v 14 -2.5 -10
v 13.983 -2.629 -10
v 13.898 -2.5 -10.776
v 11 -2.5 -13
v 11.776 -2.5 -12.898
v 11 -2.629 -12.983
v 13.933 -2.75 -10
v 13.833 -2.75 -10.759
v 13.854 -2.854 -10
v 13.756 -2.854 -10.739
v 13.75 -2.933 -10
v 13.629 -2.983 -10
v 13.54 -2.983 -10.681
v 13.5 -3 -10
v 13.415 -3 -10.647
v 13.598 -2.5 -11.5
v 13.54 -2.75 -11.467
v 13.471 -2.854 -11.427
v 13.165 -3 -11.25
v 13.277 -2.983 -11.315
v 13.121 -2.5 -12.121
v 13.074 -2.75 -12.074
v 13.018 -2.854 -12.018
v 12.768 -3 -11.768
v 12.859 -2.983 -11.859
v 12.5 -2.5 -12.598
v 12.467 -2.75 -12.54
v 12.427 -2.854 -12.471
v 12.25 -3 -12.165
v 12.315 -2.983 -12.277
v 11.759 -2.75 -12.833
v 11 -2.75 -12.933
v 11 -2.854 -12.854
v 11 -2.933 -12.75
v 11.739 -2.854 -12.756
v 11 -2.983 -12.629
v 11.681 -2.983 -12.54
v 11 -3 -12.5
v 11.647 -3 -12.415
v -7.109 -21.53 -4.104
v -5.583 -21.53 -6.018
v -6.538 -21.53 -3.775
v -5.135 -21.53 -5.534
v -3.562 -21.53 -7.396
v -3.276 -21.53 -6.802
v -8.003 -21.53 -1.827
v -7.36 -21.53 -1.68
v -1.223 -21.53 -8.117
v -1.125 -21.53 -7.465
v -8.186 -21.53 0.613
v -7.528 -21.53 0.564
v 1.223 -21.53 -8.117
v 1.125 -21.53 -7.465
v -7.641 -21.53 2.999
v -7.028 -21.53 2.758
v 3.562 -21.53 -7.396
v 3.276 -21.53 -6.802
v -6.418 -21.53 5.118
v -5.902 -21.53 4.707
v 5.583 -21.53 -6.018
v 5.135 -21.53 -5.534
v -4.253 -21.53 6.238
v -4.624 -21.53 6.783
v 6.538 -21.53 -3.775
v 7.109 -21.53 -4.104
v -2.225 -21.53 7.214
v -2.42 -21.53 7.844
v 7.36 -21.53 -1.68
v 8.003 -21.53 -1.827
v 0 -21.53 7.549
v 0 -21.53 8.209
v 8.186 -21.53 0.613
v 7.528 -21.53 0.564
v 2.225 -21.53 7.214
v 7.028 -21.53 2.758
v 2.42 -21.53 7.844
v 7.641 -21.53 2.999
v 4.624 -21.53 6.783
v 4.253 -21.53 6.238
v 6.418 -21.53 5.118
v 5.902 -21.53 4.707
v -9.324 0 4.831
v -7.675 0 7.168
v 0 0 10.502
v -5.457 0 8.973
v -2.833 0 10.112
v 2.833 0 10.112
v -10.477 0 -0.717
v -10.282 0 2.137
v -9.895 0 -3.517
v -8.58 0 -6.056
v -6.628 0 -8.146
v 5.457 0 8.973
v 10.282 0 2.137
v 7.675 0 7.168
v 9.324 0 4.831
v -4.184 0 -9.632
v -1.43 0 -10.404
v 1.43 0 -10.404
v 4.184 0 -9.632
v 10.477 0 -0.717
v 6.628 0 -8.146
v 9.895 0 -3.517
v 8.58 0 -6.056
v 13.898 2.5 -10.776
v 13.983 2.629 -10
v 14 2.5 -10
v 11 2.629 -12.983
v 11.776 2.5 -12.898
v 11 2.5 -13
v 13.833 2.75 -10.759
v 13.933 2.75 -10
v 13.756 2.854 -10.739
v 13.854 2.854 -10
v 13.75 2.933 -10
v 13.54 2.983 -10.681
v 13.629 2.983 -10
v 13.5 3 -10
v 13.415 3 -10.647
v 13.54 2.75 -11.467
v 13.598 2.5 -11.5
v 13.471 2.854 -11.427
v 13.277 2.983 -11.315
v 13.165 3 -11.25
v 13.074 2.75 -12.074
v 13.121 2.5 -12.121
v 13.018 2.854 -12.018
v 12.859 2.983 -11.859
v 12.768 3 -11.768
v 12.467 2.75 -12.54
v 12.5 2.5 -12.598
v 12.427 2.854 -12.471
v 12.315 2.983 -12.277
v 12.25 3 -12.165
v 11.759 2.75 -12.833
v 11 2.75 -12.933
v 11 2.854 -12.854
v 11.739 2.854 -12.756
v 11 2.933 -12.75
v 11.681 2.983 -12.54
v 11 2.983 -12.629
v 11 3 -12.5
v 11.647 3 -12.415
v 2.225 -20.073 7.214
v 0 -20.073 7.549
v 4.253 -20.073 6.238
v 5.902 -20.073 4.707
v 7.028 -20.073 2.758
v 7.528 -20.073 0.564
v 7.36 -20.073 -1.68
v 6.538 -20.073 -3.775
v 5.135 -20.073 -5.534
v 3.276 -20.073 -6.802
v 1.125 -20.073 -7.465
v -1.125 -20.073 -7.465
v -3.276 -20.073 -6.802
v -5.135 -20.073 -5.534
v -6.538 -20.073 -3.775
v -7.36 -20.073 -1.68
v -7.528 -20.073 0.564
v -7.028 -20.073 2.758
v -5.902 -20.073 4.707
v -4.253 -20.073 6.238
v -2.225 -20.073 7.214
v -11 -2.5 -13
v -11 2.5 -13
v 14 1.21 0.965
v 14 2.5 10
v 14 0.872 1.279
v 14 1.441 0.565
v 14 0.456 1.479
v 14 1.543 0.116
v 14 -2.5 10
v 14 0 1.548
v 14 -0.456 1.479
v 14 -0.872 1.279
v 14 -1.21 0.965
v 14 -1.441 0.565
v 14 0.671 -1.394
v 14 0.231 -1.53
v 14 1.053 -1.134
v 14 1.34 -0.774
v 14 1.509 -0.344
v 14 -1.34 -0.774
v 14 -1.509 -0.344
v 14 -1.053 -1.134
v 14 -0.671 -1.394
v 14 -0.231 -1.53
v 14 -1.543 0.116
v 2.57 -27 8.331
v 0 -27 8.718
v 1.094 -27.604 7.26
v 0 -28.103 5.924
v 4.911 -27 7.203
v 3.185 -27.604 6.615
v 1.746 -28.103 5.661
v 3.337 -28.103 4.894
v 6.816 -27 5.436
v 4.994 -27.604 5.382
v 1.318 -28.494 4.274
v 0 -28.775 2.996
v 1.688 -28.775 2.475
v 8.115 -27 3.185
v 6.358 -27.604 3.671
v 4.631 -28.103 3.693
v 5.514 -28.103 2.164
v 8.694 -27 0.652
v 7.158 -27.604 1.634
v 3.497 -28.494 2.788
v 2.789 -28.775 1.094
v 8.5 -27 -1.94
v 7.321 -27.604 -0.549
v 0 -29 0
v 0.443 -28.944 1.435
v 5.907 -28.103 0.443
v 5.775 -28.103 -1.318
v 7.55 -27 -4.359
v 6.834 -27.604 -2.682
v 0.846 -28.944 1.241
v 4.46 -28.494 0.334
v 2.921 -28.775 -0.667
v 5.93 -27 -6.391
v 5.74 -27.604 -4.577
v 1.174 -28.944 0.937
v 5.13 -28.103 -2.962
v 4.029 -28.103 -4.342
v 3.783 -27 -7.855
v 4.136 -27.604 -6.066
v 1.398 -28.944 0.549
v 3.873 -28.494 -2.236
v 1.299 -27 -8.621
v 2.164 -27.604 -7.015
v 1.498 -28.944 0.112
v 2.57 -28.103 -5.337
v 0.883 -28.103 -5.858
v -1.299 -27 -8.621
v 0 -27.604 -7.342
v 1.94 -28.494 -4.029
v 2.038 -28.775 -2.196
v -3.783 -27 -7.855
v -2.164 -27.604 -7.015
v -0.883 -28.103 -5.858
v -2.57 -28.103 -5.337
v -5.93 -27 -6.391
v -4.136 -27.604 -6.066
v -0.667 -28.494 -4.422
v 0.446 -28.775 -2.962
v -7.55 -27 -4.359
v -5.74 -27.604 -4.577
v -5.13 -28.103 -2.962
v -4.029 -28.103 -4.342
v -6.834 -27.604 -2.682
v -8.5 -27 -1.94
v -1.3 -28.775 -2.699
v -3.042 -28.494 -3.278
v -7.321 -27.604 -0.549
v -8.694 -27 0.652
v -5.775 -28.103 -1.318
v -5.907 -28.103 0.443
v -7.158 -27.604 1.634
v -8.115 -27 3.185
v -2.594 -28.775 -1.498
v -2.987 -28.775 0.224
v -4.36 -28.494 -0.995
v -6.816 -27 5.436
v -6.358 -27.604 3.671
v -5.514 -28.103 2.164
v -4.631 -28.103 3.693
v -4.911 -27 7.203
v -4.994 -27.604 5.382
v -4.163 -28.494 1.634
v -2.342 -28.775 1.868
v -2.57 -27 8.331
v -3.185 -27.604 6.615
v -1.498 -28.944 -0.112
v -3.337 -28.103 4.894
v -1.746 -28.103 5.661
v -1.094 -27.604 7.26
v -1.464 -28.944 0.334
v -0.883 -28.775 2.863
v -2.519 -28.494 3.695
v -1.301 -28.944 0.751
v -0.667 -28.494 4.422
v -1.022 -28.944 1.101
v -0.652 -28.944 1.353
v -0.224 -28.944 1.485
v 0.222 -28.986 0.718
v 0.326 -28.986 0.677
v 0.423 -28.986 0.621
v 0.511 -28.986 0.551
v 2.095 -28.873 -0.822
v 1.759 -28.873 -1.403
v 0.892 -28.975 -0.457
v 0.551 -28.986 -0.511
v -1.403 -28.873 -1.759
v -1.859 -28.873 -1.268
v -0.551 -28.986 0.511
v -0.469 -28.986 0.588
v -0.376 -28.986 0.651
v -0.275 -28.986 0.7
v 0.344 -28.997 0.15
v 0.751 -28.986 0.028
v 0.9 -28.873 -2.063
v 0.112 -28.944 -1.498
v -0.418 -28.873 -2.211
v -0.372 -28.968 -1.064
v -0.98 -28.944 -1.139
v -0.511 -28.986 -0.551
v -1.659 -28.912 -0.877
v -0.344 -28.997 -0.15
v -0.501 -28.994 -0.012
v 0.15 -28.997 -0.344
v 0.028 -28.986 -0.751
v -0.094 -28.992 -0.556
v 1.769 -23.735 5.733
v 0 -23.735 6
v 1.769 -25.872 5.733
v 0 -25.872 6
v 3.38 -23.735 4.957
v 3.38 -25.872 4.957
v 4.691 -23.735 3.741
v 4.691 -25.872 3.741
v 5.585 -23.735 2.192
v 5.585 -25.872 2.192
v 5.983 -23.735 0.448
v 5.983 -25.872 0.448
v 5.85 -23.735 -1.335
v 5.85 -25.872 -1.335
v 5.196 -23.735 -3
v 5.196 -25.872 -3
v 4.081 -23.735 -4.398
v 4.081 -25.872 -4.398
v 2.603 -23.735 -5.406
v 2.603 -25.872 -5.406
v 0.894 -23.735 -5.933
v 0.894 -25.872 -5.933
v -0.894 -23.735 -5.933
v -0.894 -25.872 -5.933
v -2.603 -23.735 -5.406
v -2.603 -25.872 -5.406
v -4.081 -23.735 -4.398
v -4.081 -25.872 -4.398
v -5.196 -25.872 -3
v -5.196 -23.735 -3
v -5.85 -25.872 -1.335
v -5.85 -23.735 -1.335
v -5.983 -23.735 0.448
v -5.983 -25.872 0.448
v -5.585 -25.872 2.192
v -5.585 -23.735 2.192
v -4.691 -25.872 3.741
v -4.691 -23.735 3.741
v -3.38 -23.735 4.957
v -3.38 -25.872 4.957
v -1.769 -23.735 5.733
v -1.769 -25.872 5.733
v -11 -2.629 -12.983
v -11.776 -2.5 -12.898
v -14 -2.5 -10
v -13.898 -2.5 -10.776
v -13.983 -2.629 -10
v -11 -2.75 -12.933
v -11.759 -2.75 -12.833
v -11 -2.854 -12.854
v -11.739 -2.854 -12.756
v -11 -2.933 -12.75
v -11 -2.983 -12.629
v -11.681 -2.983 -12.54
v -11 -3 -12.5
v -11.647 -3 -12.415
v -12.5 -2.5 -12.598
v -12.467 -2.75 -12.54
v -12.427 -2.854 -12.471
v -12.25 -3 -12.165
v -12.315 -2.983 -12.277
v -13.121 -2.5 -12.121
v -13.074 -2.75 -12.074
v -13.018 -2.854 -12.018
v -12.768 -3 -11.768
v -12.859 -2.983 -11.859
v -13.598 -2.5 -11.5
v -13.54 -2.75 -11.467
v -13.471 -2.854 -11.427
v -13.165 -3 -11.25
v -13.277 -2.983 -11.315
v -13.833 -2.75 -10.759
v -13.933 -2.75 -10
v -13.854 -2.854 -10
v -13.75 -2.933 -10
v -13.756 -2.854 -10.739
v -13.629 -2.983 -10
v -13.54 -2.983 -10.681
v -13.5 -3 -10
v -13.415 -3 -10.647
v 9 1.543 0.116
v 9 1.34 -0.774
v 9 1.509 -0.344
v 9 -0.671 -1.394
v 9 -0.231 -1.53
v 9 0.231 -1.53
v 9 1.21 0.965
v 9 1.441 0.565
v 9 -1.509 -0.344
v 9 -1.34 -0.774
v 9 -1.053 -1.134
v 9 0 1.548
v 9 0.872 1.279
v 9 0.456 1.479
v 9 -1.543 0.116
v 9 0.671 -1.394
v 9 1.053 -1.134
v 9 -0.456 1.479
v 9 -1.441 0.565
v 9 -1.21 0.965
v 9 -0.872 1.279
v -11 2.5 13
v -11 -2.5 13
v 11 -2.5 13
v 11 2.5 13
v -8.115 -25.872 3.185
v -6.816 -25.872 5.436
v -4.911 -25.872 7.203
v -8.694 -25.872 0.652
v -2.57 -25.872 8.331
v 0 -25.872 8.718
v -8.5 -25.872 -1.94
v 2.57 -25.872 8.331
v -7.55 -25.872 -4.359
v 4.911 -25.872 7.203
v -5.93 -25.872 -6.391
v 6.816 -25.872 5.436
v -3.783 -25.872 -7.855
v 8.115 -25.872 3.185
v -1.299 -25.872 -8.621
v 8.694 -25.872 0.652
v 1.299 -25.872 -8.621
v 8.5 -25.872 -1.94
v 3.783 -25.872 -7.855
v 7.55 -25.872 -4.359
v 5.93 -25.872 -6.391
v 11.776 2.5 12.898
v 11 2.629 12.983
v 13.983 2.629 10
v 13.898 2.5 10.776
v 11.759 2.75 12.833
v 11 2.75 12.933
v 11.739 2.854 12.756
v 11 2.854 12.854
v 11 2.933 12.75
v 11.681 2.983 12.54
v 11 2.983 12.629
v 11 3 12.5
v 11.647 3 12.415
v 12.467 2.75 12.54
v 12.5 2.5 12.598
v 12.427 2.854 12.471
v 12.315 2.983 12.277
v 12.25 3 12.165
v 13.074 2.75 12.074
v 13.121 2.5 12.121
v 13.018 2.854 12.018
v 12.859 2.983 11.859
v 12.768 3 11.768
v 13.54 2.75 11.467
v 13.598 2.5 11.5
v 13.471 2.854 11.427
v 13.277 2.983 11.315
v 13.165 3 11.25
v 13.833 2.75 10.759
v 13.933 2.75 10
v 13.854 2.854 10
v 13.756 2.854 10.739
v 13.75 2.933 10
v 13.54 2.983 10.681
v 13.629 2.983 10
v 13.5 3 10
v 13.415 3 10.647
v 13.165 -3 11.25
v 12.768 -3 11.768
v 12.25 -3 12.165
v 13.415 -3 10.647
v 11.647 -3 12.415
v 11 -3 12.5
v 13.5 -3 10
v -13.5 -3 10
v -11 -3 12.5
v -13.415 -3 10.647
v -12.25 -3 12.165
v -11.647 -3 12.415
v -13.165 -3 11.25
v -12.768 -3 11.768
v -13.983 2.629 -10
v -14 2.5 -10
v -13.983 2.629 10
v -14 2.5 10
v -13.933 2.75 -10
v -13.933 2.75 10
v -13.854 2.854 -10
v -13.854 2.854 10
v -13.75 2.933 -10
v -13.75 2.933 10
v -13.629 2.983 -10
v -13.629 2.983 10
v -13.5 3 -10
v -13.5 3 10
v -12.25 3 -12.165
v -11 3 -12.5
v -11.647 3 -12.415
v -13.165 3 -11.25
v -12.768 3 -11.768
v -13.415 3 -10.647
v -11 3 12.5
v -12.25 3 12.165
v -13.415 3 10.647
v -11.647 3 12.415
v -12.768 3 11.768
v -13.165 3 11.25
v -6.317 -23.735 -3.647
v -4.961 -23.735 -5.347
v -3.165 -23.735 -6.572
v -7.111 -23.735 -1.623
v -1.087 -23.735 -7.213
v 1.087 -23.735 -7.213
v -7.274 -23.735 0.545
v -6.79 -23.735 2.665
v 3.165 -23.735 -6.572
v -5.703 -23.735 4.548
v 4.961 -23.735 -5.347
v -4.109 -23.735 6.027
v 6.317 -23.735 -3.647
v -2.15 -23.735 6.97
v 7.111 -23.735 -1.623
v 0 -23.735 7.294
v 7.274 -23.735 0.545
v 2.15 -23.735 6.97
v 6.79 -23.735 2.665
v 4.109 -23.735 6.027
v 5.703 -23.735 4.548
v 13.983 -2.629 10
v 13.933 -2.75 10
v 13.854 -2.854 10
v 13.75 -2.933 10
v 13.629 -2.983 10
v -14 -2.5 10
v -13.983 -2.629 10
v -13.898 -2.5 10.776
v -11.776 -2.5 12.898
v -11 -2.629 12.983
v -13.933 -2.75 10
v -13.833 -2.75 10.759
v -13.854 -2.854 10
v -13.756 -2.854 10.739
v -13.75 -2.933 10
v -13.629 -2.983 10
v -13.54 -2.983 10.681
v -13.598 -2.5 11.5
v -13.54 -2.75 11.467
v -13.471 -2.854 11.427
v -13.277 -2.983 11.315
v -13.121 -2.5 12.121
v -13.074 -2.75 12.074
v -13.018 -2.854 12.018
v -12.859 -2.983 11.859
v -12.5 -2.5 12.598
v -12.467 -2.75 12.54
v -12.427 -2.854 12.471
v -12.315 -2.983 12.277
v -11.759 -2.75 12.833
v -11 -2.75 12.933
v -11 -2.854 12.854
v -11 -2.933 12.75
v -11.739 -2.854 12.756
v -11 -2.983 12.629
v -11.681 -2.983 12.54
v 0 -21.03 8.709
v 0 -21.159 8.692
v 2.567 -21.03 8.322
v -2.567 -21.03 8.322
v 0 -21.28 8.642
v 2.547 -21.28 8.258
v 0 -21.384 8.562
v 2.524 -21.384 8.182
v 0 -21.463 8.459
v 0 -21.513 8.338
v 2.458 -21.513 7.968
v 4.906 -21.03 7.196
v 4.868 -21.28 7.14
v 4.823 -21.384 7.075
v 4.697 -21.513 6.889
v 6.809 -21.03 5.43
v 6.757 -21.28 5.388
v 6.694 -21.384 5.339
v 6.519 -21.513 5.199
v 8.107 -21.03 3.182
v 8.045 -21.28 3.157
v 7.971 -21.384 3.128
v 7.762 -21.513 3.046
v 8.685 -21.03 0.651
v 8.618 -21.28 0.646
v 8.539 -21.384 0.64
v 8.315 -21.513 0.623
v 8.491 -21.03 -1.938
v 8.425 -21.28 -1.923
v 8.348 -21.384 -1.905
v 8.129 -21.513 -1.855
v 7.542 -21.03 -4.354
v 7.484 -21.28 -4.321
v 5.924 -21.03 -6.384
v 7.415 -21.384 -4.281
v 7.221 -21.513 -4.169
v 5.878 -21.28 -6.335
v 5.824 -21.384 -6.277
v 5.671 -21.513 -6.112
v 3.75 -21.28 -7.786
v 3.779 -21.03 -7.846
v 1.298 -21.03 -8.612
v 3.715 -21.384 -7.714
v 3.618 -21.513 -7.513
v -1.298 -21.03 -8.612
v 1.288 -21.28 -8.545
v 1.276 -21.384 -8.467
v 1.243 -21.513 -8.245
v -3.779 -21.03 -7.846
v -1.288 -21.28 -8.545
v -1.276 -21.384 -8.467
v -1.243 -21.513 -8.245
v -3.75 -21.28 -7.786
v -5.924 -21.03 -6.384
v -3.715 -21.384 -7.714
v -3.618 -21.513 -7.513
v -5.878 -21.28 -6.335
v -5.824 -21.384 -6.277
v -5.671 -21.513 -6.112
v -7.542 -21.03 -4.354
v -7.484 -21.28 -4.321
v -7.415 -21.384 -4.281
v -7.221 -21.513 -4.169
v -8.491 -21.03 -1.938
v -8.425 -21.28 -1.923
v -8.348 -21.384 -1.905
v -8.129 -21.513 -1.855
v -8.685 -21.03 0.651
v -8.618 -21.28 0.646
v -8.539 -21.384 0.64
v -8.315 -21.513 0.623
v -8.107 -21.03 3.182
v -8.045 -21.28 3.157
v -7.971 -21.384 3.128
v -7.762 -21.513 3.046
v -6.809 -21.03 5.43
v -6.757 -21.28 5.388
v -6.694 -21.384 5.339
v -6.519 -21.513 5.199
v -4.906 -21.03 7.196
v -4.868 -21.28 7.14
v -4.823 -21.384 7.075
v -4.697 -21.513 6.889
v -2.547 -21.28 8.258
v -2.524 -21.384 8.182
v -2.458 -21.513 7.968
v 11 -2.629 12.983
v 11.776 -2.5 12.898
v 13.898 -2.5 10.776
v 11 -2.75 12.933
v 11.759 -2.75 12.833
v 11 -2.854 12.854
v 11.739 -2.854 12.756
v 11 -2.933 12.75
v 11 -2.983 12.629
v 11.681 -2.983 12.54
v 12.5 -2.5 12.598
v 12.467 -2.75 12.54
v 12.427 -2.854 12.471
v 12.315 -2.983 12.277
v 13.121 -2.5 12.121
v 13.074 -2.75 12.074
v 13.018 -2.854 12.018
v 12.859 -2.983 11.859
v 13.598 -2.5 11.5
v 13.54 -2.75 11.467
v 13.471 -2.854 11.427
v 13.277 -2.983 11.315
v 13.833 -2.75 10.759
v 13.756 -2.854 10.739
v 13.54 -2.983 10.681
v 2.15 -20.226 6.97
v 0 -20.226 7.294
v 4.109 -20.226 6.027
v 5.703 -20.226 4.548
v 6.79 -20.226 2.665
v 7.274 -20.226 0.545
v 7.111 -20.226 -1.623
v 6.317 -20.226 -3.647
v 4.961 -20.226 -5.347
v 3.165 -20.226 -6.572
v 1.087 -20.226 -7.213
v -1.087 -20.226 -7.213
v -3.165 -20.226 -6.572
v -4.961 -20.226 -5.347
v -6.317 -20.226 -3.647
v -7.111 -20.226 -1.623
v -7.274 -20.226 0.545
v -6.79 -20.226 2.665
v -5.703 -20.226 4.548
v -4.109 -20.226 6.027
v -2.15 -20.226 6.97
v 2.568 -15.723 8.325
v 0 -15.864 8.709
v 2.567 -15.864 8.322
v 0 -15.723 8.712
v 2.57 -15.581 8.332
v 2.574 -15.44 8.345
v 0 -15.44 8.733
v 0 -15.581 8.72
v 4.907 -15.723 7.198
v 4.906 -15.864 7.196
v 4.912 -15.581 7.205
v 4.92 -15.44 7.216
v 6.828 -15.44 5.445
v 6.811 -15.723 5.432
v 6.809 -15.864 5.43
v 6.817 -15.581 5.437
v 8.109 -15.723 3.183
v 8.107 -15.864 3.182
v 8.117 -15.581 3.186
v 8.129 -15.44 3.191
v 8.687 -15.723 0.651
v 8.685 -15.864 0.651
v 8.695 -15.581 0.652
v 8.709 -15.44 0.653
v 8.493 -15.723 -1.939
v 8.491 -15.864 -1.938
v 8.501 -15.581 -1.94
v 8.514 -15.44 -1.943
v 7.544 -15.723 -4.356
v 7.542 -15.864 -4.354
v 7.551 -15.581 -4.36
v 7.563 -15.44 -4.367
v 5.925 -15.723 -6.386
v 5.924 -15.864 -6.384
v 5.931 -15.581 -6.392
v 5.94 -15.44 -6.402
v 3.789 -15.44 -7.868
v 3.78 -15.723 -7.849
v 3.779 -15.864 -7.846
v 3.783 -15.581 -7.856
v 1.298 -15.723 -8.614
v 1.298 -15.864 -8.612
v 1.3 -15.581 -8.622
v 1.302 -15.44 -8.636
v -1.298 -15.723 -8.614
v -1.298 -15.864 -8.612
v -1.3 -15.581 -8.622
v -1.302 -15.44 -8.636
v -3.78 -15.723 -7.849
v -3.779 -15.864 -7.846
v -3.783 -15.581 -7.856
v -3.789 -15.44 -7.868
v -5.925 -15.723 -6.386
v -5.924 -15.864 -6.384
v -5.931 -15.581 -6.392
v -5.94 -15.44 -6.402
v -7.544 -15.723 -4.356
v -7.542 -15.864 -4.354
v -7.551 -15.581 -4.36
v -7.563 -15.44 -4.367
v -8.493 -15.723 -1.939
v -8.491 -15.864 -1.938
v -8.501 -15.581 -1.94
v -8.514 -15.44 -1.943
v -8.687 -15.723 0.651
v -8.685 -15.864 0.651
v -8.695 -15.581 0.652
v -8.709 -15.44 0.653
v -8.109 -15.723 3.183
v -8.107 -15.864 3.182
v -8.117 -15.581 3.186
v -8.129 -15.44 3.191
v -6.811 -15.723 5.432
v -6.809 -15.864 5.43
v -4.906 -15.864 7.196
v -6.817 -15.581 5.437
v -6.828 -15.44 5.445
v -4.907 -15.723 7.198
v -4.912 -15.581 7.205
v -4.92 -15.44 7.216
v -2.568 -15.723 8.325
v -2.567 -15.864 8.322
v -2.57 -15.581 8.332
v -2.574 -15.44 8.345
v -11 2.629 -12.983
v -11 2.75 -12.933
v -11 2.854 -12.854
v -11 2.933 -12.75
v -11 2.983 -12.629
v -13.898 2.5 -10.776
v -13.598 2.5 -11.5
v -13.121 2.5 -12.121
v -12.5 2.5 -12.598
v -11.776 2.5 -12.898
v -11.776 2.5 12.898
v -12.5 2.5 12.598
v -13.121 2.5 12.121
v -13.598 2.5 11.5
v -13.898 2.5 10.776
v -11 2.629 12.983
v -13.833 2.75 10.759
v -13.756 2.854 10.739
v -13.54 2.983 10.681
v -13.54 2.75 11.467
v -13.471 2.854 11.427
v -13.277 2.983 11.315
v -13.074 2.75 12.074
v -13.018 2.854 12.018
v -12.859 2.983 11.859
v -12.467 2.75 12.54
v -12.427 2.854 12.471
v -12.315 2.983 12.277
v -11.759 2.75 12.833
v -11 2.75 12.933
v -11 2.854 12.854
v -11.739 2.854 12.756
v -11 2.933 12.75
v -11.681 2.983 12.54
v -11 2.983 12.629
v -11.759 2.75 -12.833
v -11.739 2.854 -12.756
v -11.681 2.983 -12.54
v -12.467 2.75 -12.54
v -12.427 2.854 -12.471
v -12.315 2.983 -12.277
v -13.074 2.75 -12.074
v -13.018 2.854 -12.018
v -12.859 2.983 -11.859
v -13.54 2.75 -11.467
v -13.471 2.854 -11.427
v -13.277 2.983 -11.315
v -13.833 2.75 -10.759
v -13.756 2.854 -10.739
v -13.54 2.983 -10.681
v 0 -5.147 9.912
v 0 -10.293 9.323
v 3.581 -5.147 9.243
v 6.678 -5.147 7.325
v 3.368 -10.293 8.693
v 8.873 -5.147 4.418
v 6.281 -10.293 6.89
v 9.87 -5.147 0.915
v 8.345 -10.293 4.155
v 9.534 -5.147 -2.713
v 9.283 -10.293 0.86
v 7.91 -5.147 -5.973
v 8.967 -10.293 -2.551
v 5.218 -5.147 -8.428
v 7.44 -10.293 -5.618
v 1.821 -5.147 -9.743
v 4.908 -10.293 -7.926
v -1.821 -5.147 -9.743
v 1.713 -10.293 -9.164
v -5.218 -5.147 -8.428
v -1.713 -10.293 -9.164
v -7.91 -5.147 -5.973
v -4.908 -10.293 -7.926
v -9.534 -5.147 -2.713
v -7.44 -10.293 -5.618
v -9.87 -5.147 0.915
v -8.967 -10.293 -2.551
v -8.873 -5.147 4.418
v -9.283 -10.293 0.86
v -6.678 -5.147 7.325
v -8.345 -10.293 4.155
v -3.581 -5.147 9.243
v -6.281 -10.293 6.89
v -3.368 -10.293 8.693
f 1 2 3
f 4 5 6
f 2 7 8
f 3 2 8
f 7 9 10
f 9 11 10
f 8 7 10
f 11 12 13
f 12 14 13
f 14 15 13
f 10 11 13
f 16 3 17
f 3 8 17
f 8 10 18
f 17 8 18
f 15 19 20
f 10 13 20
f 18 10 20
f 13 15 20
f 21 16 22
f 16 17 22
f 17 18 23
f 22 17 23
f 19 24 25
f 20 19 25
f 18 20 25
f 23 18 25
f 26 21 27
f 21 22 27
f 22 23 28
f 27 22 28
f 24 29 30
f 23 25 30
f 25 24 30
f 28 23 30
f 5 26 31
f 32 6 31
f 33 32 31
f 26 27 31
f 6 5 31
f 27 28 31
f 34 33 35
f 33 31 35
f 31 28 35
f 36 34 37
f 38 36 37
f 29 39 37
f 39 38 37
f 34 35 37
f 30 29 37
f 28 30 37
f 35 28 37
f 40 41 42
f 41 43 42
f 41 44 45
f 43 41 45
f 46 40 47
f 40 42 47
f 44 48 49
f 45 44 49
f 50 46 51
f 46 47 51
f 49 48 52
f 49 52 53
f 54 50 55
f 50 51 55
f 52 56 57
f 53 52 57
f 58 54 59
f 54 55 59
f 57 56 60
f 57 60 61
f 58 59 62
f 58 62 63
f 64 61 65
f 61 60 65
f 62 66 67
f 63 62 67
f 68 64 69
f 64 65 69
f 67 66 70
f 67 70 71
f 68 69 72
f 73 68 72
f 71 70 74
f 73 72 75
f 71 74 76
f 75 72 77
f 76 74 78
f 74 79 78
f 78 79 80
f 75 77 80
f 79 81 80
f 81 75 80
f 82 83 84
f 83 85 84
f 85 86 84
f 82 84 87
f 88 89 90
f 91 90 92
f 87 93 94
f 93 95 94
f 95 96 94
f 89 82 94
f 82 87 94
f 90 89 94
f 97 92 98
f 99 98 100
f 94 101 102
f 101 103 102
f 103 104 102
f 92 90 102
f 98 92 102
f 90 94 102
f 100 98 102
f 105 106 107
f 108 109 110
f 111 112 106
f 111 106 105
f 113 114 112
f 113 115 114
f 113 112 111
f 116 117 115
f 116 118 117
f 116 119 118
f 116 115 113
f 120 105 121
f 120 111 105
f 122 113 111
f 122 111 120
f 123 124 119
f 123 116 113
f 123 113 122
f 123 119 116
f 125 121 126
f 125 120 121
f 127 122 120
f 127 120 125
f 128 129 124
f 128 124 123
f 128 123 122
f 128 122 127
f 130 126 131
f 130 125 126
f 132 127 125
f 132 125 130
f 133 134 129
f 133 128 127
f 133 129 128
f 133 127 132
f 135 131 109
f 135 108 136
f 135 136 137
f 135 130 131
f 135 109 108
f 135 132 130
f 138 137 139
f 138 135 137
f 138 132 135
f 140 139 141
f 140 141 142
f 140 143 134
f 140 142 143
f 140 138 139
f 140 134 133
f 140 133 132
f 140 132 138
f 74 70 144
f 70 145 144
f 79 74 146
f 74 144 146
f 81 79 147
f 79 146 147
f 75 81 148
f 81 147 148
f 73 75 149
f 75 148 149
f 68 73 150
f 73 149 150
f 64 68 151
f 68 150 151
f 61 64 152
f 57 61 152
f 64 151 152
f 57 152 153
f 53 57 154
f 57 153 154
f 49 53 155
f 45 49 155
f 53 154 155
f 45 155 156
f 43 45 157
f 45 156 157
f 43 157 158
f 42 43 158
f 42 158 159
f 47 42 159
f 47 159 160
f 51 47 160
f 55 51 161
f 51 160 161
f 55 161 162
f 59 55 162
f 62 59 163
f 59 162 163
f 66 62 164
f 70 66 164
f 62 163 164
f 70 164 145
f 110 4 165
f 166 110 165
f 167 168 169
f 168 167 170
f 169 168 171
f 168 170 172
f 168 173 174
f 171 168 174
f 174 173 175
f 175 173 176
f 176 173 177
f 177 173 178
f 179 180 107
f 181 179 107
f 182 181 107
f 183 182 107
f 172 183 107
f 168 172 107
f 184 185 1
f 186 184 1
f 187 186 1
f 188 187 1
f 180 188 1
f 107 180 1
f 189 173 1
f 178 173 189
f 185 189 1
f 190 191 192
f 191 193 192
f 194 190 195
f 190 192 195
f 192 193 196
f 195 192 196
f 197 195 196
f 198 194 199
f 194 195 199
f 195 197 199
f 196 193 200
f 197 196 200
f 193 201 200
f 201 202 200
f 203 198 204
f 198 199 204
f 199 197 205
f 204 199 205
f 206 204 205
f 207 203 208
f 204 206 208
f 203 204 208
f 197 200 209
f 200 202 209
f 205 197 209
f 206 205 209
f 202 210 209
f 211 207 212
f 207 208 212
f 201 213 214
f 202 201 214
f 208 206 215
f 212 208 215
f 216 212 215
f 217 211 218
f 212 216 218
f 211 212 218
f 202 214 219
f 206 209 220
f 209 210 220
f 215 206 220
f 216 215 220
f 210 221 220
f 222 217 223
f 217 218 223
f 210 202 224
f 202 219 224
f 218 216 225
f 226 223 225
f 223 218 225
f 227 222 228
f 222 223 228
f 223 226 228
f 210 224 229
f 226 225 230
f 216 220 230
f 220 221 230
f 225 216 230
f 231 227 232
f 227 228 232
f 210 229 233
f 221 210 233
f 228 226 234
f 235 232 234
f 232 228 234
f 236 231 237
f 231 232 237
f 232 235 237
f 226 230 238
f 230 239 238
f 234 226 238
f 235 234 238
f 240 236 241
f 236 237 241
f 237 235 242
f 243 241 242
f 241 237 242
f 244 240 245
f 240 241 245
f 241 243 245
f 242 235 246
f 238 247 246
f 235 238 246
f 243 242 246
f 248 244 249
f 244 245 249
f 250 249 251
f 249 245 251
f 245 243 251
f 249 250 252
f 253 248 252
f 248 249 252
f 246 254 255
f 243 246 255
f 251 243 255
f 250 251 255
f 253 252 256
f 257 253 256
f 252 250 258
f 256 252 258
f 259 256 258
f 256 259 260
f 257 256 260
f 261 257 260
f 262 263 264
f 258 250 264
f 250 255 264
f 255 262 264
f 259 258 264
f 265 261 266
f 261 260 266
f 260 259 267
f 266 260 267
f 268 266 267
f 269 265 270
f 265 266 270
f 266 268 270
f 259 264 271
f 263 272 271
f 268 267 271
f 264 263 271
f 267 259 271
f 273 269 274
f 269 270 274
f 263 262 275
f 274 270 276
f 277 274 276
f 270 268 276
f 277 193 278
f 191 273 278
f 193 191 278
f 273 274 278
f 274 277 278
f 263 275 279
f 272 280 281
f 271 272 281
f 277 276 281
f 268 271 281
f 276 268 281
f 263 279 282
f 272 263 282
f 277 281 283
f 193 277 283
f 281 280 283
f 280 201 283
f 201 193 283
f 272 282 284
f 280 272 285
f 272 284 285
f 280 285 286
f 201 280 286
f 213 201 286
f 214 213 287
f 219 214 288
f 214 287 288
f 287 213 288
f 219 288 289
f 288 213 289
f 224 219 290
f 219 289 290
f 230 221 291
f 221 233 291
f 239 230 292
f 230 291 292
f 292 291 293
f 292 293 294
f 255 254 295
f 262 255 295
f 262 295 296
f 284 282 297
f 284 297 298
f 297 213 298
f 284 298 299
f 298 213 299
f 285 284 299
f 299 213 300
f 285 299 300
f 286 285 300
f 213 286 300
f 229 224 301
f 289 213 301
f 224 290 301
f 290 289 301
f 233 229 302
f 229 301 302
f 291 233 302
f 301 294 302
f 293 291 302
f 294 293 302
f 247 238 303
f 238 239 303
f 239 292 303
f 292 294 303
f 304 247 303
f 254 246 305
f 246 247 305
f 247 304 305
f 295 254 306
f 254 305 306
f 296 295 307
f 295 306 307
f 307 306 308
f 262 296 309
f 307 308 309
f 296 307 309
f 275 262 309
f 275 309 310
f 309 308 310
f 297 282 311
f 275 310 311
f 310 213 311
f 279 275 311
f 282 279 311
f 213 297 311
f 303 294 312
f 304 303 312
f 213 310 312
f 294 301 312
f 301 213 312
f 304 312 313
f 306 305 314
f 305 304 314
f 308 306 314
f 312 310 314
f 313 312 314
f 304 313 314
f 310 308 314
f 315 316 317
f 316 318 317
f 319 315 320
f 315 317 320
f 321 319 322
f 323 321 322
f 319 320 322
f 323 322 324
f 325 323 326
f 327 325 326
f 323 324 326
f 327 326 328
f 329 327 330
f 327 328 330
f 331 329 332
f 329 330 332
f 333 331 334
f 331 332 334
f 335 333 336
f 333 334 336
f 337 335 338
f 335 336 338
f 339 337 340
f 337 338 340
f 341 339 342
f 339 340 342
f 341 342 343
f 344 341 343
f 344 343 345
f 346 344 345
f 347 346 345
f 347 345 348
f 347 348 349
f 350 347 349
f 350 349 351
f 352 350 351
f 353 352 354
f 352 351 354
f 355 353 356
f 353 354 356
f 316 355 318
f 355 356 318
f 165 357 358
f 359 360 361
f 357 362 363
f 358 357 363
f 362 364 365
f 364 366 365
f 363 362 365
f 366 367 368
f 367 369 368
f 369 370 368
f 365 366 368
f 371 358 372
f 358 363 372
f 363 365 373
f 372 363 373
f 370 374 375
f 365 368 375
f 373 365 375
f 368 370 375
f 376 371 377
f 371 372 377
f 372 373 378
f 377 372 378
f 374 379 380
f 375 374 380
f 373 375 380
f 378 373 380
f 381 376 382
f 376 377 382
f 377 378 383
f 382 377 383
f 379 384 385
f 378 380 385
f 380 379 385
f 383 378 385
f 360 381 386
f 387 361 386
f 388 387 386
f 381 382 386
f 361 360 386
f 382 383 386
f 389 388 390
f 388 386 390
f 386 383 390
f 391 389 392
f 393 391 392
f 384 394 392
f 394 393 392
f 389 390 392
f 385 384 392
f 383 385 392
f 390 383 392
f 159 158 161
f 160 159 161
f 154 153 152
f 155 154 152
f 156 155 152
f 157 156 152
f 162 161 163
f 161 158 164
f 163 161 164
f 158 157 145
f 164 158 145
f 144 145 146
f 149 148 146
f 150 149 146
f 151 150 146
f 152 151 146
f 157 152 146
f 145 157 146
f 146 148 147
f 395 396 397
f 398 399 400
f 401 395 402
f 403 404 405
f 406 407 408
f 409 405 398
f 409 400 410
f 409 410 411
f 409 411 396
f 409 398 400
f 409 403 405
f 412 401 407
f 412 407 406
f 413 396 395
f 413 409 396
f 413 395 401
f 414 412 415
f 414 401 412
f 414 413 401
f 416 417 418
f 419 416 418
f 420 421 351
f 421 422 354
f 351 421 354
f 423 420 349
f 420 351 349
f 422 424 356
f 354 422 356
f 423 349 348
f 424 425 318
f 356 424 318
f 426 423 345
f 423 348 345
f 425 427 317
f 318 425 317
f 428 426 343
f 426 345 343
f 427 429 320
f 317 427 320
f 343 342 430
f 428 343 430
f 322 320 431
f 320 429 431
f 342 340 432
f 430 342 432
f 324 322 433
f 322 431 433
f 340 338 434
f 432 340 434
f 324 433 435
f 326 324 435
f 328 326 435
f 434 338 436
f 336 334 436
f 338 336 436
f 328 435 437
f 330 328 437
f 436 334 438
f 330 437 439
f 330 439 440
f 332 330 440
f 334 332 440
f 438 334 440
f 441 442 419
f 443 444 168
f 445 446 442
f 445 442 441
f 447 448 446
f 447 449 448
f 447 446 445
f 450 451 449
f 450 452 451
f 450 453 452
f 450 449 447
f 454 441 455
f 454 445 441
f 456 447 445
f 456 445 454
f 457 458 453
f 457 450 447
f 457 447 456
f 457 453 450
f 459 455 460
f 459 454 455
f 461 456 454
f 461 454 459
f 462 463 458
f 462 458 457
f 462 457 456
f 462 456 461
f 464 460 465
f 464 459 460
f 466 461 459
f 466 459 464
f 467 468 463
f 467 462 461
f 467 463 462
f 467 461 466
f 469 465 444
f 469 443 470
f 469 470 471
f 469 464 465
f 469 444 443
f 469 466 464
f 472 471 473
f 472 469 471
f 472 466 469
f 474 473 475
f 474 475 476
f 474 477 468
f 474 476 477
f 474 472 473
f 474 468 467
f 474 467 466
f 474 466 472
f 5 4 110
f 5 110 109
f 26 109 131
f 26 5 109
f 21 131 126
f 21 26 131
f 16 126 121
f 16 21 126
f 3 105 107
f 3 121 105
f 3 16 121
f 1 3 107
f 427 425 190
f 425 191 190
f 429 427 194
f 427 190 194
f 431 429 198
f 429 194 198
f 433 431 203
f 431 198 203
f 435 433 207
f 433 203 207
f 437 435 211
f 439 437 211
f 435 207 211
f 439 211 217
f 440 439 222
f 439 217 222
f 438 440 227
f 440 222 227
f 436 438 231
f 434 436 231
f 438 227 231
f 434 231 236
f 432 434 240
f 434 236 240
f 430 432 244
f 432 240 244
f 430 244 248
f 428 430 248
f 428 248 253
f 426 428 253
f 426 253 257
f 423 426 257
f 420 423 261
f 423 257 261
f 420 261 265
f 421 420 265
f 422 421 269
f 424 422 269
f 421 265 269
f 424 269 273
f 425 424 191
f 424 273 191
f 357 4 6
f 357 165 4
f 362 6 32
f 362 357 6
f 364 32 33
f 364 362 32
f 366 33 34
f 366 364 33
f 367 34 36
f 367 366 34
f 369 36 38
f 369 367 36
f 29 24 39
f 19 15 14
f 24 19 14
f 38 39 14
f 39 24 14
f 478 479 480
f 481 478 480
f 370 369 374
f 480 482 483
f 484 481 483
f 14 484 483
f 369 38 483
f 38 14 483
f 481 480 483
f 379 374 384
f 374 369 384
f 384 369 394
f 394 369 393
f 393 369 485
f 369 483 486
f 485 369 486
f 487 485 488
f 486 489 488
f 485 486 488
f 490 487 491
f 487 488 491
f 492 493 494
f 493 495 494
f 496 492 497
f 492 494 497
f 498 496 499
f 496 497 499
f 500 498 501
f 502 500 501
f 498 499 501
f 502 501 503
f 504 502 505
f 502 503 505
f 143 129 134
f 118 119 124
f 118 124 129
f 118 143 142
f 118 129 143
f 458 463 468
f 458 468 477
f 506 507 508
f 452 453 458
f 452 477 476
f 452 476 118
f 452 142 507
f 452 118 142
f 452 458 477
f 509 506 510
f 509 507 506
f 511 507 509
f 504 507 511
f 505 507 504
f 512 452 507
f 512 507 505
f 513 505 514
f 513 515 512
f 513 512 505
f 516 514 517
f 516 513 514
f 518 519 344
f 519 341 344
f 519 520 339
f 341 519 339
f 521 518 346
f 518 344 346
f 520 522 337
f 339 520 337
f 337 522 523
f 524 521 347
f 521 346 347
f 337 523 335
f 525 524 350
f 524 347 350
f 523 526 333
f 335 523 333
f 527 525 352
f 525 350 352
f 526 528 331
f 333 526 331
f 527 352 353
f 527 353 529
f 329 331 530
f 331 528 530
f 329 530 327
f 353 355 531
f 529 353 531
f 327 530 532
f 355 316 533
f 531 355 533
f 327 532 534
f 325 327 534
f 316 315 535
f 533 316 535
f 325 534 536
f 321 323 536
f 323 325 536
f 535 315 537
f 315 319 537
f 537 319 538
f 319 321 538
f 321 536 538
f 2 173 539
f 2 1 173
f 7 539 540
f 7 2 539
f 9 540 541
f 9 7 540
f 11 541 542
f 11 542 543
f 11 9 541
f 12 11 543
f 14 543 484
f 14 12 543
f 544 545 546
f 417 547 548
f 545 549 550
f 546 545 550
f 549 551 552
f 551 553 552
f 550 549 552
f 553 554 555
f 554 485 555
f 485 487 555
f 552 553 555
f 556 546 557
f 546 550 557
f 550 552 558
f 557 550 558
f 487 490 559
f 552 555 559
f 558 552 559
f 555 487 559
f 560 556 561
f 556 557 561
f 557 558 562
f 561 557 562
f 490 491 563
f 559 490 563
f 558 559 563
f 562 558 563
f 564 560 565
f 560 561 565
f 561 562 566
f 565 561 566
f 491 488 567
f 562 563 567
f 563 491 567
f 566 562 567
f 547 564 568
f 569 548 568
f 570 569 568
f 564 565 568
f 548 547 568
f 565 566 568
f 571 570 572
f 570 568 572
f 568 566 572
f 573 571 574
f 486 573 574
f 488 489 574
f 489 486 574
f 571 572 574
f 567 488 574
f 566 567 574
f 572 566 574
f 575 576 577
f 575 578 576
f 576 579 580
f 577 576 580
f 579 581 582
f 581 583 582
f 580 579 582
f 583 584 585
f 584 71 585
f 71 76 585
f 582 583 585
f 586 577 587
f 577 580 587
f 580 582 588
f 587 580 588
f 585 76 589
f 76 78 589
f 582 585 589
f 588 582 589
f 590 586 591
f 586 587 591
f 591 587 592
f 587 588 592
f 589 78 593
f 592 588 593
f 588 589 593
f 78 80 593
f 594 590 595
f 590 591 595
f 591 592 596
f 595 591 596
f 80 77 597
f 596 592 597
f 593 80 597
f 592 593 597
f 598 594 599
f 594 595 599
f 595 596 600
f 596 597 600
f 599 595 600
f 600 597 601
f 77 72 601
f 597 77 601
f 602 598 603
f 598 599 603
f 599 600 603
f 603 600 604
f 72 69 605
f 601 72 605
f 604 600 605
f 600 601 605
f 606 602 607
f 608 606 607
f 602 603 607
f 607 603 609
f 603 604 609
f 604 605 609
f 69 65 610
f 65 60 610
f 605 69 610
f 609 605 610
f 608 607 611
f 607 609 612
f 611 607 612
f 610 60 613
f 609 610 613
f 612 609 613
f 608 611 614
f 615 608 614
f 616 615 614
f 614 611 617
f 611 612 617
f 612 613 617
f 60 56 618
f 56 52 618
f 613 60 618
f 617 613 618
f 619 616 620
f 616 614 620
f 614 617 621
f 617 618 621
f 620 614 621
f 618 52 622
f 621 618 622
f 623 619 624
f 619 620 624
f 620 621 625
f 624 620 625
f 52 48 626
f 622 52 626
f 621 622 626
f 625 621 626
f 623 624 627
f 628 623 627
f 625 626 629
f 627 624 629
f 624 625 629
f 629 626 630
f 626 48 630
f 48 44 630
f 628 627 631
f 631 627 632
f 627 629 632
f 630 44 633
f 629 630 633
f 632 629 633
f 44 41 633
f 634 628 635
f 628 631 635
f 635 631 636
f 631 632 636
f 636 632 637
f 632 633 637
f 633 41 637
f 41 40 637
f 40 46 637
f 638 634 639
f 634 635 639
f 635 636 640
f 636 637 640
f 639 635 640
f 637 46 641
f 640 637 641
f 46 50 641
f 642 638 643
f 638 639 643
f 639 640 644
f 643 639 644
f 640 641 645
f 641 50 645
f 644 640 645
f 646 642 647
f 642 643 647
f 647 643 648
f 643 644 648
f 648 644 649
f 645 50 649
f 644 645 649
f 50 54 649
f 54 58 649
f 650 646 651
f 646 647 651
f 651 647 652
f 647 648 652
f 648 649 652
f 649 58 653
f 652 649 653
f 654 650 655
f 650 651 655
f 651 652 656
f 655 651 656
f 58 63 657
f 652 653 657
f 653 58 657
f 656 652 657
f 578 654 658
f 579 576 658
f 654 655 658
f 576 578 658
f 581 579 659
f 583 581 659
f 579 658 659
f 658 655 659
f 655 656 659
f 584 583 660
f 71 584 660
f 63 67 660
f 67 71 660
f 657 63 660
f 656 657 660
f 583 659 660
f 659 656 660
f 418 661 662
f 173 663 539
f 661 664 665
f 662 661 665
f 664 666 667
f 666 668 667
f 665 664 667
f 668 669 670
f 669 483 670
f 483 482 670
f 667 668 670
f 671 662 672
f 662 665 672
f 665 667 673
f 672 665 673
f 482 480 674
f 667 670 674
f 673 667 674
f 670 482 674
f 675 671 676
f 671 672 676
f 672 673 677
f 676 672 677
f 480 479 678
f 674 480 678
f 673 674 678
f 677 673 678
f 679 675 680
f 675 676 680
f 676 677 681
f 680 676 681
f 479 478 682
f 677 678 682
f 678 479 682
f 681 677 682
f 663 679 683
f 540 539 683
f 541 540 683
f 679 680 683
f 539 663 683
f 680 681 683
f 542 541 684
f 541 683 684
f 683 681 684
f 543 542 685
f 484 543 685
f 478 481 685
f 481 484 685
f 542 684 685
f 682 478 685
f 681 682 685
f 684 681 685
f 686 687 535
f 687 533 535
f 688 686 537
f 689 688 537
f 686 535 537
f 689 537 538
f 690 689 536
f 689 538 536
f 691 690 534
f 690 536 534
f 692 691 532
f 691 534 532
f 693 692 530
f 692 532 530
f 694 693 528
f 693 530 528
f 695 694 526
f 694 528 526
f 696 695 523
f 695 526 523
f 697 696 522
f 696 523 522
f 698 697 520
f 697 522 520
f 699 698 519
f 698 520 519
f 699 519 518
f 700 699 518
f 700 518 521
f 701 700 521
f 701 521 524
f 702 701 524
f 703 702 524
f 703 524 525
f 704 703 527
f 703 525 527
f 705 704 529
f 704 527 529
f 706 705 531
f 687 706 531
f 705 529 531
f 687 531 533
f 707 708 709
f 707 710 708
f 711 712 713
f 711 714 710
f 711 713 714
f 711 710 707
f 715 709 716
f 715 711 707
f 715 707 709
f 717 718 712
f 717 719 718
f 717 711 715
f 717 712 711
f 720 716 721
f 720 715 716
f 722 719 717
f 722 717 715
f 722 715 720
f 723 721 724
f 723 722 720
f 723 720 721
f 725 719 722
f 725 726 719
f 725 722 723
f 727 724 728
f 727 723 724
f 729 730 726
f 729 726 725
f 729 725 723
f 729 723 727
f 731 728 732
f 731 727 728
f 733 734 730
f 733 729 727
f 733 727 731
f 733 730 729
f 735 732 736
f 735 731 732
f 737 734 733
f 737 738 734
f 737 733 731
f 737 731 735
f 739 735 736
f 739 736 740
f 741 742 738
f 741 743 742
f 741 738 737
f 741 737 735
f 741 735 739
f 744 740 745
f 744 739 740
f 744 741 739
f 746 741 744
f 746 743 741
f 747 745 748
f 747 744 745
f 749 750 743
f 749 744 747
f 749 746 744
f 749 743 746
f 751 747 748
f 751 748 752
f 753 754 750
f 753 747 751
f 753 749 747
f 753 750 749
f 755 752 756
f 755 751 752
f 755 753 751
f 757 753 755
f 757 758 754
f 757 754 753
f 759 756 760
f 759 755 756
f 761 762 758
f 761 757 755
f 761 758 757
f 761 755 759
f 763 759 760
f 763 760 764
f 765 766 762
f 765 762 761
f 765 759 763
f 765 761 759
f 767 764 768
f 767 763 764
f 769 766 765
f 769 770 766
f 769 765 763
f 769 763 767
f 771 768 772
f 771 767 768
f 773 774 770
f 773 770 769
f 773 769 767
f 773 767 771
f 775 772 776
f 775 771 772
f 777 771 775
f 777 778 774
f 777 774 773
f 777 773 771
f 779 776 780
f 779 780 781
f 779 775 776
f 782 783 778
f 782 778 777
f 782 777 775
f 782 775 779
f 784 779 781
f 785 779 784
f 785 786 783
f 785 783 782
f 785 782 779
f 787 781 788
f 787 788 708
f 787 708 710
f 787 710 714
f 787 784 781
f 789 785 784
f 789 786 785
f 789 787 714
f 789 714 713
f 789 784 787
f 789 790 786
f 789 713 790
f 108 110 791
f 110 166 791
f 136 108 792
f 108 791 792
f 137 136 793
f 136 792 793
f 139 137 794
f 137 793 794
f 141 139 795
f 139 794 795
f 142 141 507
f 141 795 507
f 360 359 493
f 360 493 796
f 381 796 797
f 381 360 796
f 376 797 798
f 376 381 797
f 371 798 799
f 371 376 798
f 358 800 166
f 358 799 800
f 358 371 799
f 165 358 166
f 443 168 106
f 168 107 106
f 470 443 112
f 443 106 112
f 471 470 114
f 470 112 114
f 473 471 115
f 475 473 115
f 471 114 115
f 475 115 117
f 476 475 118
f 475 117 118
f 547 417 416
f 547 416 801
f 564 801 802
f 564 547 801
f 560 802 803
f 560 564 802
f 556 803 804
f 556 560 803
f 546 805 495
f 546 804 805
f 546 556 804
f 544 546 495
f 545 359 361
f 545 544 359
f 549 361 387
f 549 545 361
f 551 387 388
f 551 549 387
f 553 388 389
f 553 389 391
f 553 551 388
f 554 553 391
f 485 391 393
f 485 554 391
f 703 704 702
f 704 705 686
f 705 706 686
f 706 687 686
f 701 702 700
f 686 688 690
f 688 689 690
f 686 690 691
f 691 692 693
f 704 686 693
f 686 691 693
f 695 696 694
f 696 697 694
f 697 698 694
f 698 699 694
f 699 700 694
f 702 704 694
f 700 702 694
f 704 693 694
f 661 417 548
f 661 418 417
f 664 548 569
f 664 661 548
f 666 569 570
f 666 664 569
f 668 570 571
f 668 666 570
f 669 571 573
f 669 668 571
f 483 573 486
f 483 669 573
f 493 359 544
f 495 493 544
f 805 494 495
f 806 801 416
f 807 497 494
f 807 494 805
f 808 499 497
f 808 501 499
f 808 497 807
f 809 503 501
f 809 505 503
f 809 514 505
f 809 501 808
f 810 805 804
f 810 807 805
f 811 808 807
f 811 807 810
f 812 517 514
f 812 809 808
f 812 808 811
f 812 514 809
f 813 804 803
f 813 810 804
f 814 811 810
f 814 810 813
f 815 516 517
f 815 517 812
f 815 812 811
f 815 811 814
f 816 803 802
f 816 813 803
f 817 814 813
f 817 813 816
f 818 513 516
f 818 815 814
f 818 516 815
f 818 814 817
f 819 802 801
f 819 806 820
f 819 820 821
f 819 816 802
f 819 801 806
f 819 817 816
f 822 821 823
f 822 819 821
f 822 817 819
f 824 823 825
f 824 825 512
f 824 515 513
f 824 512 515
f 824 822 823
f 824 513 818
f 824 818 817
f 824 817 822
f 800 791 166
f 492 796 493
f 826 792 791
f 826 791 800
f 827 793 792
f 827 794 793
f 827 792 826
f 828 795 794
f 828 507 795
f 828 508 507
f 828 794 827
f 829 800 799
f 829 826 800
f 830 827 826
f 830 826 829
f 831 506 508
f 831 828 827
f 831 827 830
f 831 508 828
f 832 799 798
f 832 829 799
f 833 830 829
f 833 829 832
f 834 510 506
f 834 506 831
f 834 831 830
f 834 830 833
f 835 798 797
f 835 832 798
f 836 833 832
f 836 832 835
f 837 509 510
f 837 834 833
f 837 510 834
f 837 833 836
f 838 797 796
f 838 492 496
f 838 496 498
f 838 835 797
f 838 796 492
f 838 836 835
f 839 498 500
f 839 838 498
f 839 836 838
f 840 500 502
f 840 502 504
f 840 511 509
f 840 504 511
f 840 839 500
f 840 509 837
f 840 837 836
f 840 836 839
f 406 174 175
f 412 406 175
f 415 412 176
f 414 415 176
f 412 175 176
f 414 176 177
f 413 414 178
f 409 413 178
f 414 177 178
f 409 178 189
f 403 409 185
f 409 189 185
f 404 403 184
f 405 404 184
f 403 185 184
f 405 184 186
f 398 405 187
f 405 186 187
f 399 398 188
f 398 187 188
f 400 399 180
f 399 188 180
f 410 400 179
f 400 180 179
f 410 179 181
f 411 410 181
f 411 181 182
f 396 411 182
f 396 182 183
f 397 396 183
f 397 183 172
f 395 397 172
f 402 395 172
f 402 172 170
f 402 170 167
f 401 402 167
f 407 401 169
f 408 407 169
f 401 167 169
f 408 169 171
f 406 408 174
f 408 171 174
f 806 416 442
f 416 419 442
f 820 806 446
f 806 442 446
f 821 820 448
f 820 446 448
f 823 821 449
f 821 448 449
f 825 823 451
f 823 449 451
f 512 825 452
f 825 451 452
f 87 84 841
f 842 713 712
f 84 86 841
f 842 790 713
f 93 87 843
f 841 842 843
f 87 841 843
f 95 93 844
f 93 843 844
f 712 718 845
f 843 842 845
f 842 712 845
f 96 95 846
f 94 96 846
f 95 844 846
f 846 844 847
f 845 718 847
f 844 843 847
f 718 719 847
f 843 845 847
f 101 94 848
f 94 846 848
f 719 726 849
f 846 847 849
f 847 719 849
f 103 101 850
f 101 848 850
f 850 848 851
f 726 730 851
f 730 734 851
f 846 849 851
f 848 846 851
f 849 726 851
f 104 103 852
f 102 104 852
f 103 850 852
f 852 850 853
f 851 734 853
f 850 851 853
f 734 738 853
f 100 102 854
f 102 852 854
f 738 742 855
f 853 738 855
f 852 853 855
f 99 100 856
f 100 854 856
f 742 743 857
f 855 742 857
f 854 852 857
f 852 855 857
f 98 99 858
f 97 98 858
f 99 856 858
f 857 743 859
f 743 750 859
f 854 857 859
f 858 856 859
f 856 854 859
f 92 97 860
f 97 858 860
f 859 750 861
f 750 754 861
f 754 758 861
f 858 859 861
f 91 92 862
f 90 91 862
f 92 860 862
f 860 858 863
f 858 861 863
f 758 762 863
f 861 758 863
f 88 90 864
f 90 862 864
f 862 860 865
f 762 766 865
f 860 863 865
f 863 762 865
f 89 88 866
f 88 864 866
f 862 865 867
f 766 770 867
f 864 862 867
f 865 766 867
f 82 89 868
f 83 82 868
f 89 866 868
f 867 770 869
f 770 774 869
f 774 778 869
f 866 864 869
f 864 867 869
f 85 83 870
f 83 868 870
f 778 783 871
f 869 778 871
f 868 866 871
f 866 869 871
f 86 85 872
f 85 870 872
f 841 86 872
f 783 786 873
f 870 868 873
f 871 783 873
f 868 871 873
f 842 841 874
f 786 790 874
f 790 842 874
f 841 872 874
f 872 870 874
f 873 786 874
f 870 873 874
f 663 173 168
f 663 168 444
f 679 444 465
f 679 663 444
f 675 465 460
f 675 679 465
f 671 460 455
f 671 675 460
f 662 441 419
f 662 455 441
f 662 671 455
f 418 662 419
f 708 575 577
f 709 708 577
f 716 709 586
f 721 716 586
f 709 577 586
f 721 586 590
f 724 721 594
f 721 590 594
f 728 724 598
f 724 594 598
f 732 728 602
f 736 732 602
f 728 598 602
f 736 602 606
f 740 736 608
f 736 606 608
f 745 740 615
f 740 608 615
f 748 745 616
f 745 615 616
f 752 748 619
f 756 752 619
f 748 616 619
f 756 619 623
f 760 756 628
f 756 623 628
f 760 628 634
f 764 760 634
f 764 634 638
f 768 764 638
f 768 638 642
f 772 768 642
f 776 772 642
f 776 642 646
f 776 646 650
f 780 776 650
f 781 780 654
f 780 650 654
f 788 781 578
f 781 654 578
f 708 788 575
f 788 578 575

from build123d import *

# Parameters (mm, degrees)
PAD_DEPTH    = 3
SKETCH002_R  = 1.547521
POCKET_DEPTH = 5
FILLET_R     = 0.5
FILLET001_R  = 0.5
FILLET002_R  = 0.5


with BuildPart() as body:
    # Sketch → Pad (new body, symmetric)
    with BuildSketch(Plane.XZ):
        with BuildLine():
            Line((-11, 13), (11, 13))
            ThreePointArc((14, 10), (13.12132, 12.12132), (11, 13))
            Line((14, 10), (14, -10))
            ThreePointArc((11, -13), (13.12132, -12.12132), (14, -10))
            Line((11, -13), (-11, -13))
            ThreePointArc((-14, -10), (-13.12132, -12.12132), (-11, -13))
            Line((-14, -10), (-14, 10))
            ThreePointArc((-11, 13), (-13.12132, 12.12132), (-14, 10))
        make_face()
    extrude(amount=PAD_DEPTH, both=True)

    # Sketch002 → Pocket (cut)
    with BuildSketch(Plane(origin=(14, 0, 0), x_dir=(0, 0, 1), z_dir=(1, 0, 0))):
        Circle(SKETCH002_R)
    extrude(amount=-POCKET_DEPTH, mode=Mode.SUBTRACT)

    # Fillet
    fillet_edges = [body.edges().sort_by_distance(p)[0] for p in [
        (0, -3, 13),
        (13.12132, -3, 12.12132),
        (14, -3, 0),
        (13.12132, -3, -12.12132),
        (0, -3, -13),
        (-13.12132, -3, -12.12132),
        (-14, -3, 0),
        (-13.12132, -3, 12.12132),
    ]]
    fillet(fillet_edges, radius=FILLET_R)

    # Fillet001
    fillet001_edges = [body.edges().sort_by_distance(p)[0] for p in [
        (0, 3, 13),
        (13.12132, 3, 12.12132),
        (14, 3, 0),
        (13.12132, 3, -12.12132),
        (0, 3, -13),
        (-13.12132, 3, -12.12132),
        (-14, 3, 0),
        (-13.12132, 3, 12.12132),
    ]]
    fillet(fillet001_edges, radius=FILLET001_R)


with BuildPart() as body001:
    # CopySketch003 → Revolution001 (revolve)
    with BuildSketch(Plane.YZ):
        with BuildLine():
            Line((-0.000444, 0), (-0.000444, 10.501763))
            Line((-0.000444, 10.501763), (-15.439711, 8.733137))
            ThreePointArc((-15.864398, 8.708892), (-15.651709, 8.714958), (-15.439711, 8.733137))
            Line((-15.864398, 8.708892), (-21.530018, 8.708892))
            Line((-21.530018, 8.708892), (-21.530018, 7.549359))
            Line((-21.530018, 7.549359), (-20.07255, 7.549359))
            Line((-20.07255, 7.549359), (-20.07255, 0))
            Line((-20.07255, 0), (-0.000444, 0))
        make_face()
    revolve(axis=Axis((0, 0, 0), (0, 1, 0)))

    # Fillet002
    fillet002_edges = [body001.edges().sort_by_distance(p)[0] for p in [
        (0, -21.530018, -8.708892),
    ]]
    fillet(fillet002_edges, radius=FILLET002_R)


with BuildPart() as body002:
    # CopySketch003001 → Revolution002 (revolve)
    with BuildSketch(Plane.YZ):
        with BuildLine():
            Line((-20.226365, 7.294187), (-23.734522, 7.294187))
            Line((-23.734522, 7.294187), (-23.734522, 6))
            Line((-23.734522, 6), (-25.872398, 6))
            Line((-25.872398, 6), (-25.872398, 8.718128))
            Line((-25.872398, 8.718128), (-27, 8.718128))
            ThreePointArc((-27, 8.718128), (-28.493708, 4.472315), (-29.00016, 0))
            Line((-29.00016, 0), (-20.226365, 0))
            Line((-20.226365, 0), (-20.226365, 7.294187))
        make_face()
    revolve(axis=Axis((0, 0, 0), (0, 1, 0)))


solid = Compound([body.part, body001.part, body002.part])
